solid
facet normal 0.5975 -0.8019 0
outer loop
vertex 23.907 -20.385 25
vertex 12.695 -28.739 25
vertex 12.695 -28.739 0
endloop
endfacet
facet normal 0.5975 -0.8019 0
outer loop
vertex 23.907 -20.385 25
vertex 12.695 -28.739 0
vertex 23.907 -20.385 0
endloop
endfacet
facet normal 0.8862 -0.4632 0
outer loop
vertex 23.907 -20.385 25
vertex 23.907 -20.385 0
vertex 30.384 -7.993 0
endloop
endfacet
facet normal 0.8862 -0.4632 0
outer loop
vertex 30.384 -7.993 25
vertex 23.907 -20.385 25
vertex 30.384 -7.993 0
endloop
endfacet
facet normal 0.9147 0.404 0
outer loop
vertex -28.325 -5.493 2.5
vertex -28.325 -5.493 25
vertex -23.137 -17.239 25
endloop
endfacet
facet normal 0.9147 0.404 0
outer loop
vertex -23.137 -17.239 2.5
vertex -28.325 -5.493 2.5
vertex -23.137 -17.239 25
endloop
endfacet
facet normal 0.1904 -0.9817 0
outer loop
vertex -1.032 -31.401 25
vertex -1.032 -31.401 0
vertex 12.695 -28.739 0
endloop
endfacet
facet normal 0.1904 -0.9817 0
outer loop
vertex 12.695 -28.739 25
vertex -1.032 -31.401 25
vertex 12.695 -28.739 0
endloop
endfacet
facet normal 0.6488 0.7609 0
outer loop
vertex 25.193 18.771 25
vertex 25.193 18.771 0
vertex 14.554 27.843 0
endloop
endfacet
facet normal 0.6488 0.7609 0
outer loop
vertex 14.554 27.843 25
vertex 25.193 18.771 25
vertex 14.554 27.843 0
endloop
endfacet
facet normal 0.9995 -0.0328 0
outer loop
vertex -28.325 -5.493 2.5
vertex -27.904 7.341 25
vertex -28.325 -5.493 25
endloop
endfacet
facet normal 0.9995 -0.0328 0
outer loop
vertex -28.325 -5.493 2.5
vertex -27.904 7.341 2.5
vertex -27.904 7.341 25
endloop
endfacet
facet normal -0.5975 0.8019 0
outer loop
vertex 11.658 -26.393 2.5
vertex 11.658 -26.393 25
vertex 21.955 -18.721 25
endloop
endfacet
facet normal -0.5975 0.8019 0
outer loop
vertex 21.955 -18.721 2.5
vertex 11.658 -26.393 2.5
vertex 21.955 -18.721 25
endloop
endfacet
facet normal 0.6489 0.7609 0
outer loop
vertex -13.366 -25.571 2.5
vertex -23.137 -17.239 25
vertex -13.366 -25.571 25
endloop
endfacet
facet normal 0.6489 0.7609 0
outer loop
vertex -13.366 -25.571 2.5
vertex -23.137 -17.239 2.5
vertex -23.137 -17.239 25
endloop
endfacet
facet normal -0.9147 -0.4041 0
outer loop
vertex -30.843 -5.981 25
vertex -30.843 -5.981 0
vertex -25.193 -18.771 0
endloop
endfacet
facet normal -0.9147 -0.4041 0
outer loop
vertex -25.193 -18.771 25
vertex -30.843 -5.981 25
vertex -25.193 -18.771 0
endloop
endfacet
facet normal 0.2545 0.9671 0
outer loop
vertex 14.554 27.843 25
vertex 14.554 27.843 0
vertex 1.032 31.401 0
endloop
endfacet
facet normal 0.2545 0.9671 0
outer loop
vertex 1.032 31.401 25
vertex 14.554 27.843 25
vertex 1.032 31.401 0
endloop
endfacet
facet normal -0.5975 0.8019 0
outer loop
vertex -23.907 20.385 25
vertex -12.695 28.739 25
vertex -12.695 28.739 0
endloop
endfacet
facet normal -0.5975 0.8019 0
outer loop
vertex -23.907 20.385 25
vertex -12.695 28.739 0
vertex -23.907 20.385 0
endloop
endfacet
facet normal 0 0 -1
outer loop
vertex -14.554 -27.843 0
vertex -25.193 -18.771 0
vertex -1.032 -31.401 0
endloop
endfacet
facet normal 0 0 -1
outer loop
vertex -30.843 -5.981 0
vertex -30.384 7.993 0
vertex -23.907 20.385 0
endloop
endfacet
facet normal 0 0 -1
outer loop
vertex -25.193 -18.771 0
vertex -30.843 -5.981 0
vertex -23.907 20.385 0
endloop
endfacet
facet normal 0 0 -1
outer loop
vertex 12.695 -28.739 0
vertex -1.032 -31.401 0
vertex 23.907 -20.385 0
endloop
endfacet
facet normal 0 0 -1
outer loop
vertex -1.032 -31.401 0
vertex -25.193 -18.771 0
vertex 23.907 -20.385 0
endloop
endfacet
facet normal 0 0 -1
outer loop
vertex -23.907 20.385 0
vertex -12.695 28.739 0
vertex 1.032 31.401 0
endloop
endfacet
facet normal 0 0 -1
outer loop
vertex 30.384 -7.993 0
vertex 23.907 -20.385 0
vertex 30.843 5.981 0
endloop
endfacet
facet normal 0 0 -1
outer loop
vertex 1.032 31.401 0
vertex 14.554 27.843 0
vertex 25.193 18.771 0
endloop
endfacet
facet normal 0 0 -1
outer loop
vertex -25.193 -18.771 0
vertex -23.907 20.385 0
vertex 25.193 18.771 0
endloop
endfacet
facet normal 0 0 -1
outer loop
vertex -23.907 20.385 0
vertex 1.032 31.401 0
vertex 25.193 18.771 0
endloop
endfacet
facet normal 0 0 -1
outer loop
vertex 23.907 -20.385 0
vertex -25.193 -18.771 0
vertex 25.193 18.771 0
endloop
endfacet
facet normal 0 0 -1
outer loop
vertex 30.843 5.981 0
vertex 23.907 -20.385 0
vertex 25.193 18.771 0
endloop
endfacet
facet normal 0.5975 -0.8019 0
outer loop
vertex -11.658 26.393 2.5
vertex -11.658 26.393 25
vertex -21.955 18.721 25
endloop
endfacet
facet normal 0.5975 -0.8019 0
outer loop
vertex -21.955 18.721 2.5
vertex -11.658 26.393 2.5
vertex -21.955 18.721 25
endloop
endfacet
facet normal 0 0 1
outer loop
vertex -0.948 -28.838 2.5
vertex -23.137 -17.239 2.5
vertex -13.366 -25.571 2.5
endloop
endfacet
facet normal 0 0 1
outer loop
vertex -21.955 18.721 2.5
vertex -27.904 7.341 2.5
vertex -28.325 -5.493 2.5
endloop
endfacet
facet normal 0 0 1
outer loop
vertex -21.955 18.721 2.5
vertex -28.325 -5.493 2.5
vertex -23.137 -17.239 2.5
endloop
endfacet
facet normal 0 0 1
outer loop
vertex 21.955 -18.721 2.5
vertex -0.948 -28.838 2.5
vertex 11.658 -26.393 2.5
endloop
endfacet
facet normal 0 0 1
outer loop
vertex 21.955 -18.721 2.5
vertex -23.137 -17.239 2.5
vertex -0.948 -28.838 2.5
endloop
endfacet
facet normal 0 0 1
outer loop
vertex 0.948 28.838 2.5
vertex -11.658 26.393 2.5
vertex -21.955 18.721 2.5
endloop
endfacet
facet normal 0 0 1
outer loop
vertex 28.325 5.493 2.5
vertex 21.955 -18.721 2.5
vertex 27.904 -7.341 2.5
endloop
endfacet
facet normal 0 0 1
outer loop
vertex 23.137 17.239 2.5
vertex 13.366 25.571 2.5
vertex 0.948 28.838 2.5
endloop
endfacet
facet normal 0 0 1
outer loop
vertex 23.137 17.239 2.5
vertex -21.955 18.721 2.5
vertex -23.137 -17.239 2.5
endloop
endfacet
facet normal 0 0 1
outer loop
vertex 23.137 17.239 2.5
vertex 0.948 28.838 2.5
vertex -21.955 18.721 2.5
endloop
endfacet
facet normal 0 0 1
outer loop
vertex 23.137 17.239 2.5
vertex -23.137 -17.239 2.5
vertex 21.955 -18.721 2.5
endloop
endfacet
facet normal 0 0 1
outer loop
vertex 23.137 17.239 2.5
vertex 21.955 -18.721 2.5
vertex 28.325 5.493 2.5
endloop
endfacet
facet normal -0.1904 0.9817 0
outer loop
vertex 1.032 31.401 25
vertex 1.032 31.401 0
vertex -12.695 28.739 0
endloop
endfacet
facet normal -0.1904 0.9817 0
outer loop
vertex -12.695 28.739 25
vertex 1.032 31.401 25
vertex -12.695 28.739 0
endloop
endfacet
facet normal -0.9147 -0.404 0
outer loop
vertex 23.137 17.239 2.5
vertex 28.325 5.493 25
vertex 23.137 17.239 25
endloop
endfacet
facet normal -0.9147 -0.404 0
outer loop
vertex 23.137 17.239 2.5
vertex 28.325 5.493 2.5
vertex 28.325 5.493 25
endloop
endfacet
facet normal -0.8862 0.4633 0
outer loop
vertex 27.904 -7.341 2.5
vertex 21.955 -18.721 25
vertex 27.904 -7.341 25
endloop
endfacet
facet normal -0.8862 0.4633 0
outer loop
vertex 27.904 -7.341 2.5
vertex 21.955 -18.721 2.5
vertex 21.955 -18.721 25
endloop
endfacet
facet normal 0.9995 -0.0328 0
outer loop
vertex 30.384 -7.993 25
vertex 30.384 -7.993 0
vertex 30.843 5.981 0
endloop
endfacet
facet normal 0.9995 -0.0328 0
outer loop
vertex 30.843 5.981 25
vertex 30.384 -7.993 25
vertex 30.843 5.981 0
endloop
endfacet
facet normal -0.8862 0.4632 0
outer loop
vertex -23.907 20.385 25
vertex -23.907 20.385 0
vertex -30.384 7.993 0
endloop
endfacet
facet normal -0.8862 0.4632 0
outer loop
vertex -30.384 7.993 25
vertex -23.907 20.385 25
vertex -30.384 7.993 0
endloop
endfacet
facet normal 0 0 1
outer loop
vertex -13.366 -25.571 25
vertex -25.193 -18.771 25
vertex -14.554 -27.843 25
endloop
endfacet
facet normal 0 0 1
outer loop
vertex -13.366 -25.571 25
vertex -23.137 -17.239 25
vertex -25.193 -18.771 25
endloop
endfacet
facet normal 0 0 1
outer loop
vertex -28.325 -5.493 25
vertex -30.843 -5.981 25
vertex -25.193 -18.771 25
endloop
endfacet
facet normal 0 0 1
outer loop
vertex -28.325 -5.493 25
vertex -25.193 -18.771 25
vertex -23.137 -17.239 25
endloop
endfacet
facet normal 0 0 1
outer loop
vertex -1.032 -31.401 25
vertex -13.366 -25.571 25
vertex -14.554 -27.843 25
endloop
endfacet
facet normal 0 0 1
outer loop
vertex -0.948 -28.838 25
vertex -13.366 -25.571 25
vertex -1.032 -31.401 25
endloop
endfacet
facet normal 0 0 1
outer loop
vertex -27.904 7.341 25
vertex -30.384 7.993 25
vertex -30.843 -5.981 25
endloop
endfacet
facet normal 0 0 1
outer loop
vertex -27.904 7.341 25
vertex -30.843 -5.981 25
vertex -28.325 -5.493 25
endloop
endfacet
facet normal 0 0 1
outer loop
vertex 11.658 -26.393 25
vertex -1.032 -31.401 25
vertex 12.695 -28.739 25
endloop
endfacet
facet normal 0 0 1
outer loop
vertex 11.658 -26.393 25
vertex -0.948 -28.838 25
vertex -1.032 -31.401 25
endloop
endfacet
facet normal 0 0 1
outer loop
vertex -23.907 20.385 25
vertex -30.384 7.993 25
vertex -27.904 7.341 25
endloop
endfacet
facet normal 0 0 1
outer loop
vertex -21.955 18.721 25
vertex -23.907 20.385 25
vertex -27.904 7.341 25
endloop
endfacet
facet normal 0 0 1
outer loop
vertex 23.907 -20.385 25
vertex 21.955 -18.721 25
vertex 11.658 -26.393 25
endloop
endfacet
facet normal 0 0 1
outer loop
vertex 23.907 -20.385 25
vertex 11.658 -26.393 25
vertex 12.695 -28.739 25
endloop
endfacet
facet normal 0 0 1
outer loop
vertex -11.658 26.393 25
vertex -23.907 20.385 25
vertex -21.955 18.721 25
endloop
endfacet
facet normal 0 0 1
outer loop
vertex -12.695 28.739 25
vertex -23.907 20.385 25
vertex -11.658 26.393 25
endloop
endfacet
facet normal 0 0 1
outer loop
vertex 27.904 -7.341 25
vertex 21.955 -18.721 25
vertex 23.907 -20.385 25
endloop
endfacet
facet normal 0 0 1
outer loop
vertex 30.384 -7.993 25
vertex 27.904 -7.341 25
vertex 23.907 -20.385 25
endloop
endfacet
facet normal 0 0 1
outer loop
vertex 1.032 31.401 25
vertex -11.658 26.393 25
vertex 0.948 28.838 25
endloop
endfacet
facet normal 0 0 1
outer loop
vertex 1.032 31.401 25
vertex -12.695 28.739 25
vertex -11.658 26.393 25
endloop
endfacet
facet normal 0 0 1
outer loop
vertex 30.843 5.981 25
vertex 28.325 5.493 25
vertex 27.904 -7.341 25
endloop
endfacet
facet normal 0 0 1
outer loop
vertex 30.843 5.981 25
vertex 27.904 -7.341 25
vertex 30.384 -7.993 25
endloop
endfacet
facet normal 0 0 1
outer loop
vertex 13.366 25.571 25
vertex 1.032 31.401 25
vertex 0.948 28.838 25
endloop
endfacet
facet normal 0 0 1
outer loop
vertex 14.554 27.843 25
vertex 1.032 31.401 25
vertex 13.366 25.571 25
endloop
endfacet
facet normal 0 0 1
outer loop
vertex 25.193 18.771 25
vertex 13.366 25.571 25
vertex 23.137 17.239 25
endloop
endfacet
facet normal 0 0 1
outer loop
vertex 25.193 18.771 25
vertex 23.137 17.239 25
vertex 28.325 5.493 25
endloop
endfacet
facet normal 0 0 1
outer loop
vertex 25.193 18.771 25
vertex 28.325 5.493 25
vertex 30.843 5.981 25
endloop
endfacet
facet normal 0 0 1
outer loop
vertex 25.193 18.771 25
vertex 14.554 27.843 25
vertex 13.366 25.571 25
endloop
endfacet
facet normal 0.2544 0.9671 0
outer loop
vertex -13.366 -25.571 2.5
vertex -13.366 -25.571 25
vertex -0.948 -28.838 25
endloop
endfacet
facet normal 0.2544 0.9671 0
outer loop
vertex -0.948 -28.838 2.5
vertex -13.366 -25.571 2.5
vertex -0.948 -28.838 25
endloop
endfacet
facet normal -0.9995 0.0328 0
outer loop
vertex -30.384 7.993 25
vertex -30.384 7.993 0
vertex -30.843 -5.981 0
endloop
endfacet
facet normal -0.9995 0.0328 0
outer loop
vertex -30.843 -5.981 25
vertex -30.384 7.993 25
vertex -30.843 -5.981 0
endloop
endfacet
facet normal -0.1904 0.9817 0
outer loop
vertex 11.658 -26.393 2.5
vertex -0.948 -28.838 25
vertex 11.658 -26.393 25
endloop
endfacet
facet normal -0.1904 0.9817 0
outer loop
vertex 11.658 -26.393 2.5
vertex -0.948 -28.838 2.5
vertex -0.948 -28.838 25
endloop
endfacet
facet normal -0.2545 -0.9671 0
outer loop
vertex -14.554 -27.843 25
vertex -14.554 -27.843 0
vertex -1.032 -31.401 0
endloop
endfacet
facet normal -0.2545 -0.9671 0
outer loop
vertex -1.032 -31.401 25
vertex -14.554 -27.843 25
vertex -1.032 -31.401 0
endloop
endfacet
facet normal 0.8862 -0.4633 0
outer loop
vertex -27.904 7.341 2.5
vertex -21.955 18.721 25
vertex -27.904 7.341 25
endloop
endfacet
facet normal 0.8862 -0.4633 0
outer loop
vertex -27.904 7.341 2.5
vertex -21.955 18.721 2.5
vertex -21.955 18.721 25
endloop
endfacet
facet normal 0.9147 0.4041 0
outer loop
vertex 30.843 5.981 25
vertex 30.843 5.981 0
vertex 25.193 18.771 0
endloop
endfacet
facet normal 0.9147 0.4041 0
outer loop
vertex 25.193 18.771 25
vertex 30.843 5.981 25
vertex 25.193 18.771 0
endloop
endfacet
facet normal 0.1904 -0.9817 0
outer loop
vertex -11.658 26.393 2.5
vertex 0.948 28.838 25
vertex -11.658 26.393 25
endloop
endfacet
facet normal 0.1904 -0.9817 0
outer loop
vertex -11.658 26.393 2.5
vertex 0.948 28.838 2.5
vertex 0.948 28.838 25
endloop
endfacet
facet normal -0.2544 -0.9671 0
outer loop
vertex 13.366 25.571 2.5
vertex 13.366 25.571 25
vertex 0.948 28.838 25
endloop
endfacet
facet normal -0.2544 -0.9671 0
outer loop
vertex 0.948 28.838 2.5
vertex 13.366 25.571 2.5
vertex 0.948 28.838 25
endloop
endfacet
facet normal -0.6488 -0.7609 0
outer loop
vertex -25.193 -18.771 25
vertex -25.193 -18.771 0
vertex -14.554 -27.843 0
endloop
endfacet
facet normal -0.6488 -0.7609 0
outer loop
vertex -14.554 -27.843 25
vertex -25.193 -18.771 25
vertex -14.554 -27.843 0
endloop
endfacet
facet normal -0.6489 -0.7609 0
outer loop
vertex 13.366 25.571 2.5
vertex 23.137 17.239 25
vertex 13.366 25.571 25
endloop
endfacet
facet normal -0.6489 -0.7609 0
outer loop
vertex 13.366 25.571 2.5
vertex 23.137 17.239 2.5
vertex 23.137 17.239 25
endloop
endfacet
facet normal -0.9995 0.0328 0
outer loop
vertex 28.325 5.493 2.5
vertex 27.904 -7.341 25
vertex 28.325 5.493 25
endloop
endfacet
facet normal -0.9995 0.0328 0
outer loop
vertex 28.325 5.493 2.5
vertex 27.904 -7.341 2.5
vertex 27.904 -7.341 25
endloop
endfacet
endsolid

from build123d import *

# Parameters (mm, degrees)
F1_DEPTH = 25
F2_T     = -2.5


with BuildPart() as f1:
    # F0 (on Top) → F1 (new body)
    with BuildSketch(Plane.XY):
        Polygon((-12.694525, 28.738617), (-23.90659, 20.384651), (-30.383662, 7.993256), (-30.842877, -5.981303), (-25.193282, -18.77119), (-14.553849, -27.843214), (-1.031847, -31.400547), (12.694525, -28.738617), (23.90659, -20.384651), (30.383662, -7.993256), (30.842877, 5.981303), (25.193282, 18.77119), (14.553849, 27.843214), (1.031847, 31.400547), align=None)
    extrude(amount=F1_DEPTH)

    # F2
    f2_openings = [f1.faces().sort_by_distance(p)[0] for p in [
        (0, 0, 25),
    ]]
    offset(amount=F2_T, openings=f2_openings)


solid = f1.part
